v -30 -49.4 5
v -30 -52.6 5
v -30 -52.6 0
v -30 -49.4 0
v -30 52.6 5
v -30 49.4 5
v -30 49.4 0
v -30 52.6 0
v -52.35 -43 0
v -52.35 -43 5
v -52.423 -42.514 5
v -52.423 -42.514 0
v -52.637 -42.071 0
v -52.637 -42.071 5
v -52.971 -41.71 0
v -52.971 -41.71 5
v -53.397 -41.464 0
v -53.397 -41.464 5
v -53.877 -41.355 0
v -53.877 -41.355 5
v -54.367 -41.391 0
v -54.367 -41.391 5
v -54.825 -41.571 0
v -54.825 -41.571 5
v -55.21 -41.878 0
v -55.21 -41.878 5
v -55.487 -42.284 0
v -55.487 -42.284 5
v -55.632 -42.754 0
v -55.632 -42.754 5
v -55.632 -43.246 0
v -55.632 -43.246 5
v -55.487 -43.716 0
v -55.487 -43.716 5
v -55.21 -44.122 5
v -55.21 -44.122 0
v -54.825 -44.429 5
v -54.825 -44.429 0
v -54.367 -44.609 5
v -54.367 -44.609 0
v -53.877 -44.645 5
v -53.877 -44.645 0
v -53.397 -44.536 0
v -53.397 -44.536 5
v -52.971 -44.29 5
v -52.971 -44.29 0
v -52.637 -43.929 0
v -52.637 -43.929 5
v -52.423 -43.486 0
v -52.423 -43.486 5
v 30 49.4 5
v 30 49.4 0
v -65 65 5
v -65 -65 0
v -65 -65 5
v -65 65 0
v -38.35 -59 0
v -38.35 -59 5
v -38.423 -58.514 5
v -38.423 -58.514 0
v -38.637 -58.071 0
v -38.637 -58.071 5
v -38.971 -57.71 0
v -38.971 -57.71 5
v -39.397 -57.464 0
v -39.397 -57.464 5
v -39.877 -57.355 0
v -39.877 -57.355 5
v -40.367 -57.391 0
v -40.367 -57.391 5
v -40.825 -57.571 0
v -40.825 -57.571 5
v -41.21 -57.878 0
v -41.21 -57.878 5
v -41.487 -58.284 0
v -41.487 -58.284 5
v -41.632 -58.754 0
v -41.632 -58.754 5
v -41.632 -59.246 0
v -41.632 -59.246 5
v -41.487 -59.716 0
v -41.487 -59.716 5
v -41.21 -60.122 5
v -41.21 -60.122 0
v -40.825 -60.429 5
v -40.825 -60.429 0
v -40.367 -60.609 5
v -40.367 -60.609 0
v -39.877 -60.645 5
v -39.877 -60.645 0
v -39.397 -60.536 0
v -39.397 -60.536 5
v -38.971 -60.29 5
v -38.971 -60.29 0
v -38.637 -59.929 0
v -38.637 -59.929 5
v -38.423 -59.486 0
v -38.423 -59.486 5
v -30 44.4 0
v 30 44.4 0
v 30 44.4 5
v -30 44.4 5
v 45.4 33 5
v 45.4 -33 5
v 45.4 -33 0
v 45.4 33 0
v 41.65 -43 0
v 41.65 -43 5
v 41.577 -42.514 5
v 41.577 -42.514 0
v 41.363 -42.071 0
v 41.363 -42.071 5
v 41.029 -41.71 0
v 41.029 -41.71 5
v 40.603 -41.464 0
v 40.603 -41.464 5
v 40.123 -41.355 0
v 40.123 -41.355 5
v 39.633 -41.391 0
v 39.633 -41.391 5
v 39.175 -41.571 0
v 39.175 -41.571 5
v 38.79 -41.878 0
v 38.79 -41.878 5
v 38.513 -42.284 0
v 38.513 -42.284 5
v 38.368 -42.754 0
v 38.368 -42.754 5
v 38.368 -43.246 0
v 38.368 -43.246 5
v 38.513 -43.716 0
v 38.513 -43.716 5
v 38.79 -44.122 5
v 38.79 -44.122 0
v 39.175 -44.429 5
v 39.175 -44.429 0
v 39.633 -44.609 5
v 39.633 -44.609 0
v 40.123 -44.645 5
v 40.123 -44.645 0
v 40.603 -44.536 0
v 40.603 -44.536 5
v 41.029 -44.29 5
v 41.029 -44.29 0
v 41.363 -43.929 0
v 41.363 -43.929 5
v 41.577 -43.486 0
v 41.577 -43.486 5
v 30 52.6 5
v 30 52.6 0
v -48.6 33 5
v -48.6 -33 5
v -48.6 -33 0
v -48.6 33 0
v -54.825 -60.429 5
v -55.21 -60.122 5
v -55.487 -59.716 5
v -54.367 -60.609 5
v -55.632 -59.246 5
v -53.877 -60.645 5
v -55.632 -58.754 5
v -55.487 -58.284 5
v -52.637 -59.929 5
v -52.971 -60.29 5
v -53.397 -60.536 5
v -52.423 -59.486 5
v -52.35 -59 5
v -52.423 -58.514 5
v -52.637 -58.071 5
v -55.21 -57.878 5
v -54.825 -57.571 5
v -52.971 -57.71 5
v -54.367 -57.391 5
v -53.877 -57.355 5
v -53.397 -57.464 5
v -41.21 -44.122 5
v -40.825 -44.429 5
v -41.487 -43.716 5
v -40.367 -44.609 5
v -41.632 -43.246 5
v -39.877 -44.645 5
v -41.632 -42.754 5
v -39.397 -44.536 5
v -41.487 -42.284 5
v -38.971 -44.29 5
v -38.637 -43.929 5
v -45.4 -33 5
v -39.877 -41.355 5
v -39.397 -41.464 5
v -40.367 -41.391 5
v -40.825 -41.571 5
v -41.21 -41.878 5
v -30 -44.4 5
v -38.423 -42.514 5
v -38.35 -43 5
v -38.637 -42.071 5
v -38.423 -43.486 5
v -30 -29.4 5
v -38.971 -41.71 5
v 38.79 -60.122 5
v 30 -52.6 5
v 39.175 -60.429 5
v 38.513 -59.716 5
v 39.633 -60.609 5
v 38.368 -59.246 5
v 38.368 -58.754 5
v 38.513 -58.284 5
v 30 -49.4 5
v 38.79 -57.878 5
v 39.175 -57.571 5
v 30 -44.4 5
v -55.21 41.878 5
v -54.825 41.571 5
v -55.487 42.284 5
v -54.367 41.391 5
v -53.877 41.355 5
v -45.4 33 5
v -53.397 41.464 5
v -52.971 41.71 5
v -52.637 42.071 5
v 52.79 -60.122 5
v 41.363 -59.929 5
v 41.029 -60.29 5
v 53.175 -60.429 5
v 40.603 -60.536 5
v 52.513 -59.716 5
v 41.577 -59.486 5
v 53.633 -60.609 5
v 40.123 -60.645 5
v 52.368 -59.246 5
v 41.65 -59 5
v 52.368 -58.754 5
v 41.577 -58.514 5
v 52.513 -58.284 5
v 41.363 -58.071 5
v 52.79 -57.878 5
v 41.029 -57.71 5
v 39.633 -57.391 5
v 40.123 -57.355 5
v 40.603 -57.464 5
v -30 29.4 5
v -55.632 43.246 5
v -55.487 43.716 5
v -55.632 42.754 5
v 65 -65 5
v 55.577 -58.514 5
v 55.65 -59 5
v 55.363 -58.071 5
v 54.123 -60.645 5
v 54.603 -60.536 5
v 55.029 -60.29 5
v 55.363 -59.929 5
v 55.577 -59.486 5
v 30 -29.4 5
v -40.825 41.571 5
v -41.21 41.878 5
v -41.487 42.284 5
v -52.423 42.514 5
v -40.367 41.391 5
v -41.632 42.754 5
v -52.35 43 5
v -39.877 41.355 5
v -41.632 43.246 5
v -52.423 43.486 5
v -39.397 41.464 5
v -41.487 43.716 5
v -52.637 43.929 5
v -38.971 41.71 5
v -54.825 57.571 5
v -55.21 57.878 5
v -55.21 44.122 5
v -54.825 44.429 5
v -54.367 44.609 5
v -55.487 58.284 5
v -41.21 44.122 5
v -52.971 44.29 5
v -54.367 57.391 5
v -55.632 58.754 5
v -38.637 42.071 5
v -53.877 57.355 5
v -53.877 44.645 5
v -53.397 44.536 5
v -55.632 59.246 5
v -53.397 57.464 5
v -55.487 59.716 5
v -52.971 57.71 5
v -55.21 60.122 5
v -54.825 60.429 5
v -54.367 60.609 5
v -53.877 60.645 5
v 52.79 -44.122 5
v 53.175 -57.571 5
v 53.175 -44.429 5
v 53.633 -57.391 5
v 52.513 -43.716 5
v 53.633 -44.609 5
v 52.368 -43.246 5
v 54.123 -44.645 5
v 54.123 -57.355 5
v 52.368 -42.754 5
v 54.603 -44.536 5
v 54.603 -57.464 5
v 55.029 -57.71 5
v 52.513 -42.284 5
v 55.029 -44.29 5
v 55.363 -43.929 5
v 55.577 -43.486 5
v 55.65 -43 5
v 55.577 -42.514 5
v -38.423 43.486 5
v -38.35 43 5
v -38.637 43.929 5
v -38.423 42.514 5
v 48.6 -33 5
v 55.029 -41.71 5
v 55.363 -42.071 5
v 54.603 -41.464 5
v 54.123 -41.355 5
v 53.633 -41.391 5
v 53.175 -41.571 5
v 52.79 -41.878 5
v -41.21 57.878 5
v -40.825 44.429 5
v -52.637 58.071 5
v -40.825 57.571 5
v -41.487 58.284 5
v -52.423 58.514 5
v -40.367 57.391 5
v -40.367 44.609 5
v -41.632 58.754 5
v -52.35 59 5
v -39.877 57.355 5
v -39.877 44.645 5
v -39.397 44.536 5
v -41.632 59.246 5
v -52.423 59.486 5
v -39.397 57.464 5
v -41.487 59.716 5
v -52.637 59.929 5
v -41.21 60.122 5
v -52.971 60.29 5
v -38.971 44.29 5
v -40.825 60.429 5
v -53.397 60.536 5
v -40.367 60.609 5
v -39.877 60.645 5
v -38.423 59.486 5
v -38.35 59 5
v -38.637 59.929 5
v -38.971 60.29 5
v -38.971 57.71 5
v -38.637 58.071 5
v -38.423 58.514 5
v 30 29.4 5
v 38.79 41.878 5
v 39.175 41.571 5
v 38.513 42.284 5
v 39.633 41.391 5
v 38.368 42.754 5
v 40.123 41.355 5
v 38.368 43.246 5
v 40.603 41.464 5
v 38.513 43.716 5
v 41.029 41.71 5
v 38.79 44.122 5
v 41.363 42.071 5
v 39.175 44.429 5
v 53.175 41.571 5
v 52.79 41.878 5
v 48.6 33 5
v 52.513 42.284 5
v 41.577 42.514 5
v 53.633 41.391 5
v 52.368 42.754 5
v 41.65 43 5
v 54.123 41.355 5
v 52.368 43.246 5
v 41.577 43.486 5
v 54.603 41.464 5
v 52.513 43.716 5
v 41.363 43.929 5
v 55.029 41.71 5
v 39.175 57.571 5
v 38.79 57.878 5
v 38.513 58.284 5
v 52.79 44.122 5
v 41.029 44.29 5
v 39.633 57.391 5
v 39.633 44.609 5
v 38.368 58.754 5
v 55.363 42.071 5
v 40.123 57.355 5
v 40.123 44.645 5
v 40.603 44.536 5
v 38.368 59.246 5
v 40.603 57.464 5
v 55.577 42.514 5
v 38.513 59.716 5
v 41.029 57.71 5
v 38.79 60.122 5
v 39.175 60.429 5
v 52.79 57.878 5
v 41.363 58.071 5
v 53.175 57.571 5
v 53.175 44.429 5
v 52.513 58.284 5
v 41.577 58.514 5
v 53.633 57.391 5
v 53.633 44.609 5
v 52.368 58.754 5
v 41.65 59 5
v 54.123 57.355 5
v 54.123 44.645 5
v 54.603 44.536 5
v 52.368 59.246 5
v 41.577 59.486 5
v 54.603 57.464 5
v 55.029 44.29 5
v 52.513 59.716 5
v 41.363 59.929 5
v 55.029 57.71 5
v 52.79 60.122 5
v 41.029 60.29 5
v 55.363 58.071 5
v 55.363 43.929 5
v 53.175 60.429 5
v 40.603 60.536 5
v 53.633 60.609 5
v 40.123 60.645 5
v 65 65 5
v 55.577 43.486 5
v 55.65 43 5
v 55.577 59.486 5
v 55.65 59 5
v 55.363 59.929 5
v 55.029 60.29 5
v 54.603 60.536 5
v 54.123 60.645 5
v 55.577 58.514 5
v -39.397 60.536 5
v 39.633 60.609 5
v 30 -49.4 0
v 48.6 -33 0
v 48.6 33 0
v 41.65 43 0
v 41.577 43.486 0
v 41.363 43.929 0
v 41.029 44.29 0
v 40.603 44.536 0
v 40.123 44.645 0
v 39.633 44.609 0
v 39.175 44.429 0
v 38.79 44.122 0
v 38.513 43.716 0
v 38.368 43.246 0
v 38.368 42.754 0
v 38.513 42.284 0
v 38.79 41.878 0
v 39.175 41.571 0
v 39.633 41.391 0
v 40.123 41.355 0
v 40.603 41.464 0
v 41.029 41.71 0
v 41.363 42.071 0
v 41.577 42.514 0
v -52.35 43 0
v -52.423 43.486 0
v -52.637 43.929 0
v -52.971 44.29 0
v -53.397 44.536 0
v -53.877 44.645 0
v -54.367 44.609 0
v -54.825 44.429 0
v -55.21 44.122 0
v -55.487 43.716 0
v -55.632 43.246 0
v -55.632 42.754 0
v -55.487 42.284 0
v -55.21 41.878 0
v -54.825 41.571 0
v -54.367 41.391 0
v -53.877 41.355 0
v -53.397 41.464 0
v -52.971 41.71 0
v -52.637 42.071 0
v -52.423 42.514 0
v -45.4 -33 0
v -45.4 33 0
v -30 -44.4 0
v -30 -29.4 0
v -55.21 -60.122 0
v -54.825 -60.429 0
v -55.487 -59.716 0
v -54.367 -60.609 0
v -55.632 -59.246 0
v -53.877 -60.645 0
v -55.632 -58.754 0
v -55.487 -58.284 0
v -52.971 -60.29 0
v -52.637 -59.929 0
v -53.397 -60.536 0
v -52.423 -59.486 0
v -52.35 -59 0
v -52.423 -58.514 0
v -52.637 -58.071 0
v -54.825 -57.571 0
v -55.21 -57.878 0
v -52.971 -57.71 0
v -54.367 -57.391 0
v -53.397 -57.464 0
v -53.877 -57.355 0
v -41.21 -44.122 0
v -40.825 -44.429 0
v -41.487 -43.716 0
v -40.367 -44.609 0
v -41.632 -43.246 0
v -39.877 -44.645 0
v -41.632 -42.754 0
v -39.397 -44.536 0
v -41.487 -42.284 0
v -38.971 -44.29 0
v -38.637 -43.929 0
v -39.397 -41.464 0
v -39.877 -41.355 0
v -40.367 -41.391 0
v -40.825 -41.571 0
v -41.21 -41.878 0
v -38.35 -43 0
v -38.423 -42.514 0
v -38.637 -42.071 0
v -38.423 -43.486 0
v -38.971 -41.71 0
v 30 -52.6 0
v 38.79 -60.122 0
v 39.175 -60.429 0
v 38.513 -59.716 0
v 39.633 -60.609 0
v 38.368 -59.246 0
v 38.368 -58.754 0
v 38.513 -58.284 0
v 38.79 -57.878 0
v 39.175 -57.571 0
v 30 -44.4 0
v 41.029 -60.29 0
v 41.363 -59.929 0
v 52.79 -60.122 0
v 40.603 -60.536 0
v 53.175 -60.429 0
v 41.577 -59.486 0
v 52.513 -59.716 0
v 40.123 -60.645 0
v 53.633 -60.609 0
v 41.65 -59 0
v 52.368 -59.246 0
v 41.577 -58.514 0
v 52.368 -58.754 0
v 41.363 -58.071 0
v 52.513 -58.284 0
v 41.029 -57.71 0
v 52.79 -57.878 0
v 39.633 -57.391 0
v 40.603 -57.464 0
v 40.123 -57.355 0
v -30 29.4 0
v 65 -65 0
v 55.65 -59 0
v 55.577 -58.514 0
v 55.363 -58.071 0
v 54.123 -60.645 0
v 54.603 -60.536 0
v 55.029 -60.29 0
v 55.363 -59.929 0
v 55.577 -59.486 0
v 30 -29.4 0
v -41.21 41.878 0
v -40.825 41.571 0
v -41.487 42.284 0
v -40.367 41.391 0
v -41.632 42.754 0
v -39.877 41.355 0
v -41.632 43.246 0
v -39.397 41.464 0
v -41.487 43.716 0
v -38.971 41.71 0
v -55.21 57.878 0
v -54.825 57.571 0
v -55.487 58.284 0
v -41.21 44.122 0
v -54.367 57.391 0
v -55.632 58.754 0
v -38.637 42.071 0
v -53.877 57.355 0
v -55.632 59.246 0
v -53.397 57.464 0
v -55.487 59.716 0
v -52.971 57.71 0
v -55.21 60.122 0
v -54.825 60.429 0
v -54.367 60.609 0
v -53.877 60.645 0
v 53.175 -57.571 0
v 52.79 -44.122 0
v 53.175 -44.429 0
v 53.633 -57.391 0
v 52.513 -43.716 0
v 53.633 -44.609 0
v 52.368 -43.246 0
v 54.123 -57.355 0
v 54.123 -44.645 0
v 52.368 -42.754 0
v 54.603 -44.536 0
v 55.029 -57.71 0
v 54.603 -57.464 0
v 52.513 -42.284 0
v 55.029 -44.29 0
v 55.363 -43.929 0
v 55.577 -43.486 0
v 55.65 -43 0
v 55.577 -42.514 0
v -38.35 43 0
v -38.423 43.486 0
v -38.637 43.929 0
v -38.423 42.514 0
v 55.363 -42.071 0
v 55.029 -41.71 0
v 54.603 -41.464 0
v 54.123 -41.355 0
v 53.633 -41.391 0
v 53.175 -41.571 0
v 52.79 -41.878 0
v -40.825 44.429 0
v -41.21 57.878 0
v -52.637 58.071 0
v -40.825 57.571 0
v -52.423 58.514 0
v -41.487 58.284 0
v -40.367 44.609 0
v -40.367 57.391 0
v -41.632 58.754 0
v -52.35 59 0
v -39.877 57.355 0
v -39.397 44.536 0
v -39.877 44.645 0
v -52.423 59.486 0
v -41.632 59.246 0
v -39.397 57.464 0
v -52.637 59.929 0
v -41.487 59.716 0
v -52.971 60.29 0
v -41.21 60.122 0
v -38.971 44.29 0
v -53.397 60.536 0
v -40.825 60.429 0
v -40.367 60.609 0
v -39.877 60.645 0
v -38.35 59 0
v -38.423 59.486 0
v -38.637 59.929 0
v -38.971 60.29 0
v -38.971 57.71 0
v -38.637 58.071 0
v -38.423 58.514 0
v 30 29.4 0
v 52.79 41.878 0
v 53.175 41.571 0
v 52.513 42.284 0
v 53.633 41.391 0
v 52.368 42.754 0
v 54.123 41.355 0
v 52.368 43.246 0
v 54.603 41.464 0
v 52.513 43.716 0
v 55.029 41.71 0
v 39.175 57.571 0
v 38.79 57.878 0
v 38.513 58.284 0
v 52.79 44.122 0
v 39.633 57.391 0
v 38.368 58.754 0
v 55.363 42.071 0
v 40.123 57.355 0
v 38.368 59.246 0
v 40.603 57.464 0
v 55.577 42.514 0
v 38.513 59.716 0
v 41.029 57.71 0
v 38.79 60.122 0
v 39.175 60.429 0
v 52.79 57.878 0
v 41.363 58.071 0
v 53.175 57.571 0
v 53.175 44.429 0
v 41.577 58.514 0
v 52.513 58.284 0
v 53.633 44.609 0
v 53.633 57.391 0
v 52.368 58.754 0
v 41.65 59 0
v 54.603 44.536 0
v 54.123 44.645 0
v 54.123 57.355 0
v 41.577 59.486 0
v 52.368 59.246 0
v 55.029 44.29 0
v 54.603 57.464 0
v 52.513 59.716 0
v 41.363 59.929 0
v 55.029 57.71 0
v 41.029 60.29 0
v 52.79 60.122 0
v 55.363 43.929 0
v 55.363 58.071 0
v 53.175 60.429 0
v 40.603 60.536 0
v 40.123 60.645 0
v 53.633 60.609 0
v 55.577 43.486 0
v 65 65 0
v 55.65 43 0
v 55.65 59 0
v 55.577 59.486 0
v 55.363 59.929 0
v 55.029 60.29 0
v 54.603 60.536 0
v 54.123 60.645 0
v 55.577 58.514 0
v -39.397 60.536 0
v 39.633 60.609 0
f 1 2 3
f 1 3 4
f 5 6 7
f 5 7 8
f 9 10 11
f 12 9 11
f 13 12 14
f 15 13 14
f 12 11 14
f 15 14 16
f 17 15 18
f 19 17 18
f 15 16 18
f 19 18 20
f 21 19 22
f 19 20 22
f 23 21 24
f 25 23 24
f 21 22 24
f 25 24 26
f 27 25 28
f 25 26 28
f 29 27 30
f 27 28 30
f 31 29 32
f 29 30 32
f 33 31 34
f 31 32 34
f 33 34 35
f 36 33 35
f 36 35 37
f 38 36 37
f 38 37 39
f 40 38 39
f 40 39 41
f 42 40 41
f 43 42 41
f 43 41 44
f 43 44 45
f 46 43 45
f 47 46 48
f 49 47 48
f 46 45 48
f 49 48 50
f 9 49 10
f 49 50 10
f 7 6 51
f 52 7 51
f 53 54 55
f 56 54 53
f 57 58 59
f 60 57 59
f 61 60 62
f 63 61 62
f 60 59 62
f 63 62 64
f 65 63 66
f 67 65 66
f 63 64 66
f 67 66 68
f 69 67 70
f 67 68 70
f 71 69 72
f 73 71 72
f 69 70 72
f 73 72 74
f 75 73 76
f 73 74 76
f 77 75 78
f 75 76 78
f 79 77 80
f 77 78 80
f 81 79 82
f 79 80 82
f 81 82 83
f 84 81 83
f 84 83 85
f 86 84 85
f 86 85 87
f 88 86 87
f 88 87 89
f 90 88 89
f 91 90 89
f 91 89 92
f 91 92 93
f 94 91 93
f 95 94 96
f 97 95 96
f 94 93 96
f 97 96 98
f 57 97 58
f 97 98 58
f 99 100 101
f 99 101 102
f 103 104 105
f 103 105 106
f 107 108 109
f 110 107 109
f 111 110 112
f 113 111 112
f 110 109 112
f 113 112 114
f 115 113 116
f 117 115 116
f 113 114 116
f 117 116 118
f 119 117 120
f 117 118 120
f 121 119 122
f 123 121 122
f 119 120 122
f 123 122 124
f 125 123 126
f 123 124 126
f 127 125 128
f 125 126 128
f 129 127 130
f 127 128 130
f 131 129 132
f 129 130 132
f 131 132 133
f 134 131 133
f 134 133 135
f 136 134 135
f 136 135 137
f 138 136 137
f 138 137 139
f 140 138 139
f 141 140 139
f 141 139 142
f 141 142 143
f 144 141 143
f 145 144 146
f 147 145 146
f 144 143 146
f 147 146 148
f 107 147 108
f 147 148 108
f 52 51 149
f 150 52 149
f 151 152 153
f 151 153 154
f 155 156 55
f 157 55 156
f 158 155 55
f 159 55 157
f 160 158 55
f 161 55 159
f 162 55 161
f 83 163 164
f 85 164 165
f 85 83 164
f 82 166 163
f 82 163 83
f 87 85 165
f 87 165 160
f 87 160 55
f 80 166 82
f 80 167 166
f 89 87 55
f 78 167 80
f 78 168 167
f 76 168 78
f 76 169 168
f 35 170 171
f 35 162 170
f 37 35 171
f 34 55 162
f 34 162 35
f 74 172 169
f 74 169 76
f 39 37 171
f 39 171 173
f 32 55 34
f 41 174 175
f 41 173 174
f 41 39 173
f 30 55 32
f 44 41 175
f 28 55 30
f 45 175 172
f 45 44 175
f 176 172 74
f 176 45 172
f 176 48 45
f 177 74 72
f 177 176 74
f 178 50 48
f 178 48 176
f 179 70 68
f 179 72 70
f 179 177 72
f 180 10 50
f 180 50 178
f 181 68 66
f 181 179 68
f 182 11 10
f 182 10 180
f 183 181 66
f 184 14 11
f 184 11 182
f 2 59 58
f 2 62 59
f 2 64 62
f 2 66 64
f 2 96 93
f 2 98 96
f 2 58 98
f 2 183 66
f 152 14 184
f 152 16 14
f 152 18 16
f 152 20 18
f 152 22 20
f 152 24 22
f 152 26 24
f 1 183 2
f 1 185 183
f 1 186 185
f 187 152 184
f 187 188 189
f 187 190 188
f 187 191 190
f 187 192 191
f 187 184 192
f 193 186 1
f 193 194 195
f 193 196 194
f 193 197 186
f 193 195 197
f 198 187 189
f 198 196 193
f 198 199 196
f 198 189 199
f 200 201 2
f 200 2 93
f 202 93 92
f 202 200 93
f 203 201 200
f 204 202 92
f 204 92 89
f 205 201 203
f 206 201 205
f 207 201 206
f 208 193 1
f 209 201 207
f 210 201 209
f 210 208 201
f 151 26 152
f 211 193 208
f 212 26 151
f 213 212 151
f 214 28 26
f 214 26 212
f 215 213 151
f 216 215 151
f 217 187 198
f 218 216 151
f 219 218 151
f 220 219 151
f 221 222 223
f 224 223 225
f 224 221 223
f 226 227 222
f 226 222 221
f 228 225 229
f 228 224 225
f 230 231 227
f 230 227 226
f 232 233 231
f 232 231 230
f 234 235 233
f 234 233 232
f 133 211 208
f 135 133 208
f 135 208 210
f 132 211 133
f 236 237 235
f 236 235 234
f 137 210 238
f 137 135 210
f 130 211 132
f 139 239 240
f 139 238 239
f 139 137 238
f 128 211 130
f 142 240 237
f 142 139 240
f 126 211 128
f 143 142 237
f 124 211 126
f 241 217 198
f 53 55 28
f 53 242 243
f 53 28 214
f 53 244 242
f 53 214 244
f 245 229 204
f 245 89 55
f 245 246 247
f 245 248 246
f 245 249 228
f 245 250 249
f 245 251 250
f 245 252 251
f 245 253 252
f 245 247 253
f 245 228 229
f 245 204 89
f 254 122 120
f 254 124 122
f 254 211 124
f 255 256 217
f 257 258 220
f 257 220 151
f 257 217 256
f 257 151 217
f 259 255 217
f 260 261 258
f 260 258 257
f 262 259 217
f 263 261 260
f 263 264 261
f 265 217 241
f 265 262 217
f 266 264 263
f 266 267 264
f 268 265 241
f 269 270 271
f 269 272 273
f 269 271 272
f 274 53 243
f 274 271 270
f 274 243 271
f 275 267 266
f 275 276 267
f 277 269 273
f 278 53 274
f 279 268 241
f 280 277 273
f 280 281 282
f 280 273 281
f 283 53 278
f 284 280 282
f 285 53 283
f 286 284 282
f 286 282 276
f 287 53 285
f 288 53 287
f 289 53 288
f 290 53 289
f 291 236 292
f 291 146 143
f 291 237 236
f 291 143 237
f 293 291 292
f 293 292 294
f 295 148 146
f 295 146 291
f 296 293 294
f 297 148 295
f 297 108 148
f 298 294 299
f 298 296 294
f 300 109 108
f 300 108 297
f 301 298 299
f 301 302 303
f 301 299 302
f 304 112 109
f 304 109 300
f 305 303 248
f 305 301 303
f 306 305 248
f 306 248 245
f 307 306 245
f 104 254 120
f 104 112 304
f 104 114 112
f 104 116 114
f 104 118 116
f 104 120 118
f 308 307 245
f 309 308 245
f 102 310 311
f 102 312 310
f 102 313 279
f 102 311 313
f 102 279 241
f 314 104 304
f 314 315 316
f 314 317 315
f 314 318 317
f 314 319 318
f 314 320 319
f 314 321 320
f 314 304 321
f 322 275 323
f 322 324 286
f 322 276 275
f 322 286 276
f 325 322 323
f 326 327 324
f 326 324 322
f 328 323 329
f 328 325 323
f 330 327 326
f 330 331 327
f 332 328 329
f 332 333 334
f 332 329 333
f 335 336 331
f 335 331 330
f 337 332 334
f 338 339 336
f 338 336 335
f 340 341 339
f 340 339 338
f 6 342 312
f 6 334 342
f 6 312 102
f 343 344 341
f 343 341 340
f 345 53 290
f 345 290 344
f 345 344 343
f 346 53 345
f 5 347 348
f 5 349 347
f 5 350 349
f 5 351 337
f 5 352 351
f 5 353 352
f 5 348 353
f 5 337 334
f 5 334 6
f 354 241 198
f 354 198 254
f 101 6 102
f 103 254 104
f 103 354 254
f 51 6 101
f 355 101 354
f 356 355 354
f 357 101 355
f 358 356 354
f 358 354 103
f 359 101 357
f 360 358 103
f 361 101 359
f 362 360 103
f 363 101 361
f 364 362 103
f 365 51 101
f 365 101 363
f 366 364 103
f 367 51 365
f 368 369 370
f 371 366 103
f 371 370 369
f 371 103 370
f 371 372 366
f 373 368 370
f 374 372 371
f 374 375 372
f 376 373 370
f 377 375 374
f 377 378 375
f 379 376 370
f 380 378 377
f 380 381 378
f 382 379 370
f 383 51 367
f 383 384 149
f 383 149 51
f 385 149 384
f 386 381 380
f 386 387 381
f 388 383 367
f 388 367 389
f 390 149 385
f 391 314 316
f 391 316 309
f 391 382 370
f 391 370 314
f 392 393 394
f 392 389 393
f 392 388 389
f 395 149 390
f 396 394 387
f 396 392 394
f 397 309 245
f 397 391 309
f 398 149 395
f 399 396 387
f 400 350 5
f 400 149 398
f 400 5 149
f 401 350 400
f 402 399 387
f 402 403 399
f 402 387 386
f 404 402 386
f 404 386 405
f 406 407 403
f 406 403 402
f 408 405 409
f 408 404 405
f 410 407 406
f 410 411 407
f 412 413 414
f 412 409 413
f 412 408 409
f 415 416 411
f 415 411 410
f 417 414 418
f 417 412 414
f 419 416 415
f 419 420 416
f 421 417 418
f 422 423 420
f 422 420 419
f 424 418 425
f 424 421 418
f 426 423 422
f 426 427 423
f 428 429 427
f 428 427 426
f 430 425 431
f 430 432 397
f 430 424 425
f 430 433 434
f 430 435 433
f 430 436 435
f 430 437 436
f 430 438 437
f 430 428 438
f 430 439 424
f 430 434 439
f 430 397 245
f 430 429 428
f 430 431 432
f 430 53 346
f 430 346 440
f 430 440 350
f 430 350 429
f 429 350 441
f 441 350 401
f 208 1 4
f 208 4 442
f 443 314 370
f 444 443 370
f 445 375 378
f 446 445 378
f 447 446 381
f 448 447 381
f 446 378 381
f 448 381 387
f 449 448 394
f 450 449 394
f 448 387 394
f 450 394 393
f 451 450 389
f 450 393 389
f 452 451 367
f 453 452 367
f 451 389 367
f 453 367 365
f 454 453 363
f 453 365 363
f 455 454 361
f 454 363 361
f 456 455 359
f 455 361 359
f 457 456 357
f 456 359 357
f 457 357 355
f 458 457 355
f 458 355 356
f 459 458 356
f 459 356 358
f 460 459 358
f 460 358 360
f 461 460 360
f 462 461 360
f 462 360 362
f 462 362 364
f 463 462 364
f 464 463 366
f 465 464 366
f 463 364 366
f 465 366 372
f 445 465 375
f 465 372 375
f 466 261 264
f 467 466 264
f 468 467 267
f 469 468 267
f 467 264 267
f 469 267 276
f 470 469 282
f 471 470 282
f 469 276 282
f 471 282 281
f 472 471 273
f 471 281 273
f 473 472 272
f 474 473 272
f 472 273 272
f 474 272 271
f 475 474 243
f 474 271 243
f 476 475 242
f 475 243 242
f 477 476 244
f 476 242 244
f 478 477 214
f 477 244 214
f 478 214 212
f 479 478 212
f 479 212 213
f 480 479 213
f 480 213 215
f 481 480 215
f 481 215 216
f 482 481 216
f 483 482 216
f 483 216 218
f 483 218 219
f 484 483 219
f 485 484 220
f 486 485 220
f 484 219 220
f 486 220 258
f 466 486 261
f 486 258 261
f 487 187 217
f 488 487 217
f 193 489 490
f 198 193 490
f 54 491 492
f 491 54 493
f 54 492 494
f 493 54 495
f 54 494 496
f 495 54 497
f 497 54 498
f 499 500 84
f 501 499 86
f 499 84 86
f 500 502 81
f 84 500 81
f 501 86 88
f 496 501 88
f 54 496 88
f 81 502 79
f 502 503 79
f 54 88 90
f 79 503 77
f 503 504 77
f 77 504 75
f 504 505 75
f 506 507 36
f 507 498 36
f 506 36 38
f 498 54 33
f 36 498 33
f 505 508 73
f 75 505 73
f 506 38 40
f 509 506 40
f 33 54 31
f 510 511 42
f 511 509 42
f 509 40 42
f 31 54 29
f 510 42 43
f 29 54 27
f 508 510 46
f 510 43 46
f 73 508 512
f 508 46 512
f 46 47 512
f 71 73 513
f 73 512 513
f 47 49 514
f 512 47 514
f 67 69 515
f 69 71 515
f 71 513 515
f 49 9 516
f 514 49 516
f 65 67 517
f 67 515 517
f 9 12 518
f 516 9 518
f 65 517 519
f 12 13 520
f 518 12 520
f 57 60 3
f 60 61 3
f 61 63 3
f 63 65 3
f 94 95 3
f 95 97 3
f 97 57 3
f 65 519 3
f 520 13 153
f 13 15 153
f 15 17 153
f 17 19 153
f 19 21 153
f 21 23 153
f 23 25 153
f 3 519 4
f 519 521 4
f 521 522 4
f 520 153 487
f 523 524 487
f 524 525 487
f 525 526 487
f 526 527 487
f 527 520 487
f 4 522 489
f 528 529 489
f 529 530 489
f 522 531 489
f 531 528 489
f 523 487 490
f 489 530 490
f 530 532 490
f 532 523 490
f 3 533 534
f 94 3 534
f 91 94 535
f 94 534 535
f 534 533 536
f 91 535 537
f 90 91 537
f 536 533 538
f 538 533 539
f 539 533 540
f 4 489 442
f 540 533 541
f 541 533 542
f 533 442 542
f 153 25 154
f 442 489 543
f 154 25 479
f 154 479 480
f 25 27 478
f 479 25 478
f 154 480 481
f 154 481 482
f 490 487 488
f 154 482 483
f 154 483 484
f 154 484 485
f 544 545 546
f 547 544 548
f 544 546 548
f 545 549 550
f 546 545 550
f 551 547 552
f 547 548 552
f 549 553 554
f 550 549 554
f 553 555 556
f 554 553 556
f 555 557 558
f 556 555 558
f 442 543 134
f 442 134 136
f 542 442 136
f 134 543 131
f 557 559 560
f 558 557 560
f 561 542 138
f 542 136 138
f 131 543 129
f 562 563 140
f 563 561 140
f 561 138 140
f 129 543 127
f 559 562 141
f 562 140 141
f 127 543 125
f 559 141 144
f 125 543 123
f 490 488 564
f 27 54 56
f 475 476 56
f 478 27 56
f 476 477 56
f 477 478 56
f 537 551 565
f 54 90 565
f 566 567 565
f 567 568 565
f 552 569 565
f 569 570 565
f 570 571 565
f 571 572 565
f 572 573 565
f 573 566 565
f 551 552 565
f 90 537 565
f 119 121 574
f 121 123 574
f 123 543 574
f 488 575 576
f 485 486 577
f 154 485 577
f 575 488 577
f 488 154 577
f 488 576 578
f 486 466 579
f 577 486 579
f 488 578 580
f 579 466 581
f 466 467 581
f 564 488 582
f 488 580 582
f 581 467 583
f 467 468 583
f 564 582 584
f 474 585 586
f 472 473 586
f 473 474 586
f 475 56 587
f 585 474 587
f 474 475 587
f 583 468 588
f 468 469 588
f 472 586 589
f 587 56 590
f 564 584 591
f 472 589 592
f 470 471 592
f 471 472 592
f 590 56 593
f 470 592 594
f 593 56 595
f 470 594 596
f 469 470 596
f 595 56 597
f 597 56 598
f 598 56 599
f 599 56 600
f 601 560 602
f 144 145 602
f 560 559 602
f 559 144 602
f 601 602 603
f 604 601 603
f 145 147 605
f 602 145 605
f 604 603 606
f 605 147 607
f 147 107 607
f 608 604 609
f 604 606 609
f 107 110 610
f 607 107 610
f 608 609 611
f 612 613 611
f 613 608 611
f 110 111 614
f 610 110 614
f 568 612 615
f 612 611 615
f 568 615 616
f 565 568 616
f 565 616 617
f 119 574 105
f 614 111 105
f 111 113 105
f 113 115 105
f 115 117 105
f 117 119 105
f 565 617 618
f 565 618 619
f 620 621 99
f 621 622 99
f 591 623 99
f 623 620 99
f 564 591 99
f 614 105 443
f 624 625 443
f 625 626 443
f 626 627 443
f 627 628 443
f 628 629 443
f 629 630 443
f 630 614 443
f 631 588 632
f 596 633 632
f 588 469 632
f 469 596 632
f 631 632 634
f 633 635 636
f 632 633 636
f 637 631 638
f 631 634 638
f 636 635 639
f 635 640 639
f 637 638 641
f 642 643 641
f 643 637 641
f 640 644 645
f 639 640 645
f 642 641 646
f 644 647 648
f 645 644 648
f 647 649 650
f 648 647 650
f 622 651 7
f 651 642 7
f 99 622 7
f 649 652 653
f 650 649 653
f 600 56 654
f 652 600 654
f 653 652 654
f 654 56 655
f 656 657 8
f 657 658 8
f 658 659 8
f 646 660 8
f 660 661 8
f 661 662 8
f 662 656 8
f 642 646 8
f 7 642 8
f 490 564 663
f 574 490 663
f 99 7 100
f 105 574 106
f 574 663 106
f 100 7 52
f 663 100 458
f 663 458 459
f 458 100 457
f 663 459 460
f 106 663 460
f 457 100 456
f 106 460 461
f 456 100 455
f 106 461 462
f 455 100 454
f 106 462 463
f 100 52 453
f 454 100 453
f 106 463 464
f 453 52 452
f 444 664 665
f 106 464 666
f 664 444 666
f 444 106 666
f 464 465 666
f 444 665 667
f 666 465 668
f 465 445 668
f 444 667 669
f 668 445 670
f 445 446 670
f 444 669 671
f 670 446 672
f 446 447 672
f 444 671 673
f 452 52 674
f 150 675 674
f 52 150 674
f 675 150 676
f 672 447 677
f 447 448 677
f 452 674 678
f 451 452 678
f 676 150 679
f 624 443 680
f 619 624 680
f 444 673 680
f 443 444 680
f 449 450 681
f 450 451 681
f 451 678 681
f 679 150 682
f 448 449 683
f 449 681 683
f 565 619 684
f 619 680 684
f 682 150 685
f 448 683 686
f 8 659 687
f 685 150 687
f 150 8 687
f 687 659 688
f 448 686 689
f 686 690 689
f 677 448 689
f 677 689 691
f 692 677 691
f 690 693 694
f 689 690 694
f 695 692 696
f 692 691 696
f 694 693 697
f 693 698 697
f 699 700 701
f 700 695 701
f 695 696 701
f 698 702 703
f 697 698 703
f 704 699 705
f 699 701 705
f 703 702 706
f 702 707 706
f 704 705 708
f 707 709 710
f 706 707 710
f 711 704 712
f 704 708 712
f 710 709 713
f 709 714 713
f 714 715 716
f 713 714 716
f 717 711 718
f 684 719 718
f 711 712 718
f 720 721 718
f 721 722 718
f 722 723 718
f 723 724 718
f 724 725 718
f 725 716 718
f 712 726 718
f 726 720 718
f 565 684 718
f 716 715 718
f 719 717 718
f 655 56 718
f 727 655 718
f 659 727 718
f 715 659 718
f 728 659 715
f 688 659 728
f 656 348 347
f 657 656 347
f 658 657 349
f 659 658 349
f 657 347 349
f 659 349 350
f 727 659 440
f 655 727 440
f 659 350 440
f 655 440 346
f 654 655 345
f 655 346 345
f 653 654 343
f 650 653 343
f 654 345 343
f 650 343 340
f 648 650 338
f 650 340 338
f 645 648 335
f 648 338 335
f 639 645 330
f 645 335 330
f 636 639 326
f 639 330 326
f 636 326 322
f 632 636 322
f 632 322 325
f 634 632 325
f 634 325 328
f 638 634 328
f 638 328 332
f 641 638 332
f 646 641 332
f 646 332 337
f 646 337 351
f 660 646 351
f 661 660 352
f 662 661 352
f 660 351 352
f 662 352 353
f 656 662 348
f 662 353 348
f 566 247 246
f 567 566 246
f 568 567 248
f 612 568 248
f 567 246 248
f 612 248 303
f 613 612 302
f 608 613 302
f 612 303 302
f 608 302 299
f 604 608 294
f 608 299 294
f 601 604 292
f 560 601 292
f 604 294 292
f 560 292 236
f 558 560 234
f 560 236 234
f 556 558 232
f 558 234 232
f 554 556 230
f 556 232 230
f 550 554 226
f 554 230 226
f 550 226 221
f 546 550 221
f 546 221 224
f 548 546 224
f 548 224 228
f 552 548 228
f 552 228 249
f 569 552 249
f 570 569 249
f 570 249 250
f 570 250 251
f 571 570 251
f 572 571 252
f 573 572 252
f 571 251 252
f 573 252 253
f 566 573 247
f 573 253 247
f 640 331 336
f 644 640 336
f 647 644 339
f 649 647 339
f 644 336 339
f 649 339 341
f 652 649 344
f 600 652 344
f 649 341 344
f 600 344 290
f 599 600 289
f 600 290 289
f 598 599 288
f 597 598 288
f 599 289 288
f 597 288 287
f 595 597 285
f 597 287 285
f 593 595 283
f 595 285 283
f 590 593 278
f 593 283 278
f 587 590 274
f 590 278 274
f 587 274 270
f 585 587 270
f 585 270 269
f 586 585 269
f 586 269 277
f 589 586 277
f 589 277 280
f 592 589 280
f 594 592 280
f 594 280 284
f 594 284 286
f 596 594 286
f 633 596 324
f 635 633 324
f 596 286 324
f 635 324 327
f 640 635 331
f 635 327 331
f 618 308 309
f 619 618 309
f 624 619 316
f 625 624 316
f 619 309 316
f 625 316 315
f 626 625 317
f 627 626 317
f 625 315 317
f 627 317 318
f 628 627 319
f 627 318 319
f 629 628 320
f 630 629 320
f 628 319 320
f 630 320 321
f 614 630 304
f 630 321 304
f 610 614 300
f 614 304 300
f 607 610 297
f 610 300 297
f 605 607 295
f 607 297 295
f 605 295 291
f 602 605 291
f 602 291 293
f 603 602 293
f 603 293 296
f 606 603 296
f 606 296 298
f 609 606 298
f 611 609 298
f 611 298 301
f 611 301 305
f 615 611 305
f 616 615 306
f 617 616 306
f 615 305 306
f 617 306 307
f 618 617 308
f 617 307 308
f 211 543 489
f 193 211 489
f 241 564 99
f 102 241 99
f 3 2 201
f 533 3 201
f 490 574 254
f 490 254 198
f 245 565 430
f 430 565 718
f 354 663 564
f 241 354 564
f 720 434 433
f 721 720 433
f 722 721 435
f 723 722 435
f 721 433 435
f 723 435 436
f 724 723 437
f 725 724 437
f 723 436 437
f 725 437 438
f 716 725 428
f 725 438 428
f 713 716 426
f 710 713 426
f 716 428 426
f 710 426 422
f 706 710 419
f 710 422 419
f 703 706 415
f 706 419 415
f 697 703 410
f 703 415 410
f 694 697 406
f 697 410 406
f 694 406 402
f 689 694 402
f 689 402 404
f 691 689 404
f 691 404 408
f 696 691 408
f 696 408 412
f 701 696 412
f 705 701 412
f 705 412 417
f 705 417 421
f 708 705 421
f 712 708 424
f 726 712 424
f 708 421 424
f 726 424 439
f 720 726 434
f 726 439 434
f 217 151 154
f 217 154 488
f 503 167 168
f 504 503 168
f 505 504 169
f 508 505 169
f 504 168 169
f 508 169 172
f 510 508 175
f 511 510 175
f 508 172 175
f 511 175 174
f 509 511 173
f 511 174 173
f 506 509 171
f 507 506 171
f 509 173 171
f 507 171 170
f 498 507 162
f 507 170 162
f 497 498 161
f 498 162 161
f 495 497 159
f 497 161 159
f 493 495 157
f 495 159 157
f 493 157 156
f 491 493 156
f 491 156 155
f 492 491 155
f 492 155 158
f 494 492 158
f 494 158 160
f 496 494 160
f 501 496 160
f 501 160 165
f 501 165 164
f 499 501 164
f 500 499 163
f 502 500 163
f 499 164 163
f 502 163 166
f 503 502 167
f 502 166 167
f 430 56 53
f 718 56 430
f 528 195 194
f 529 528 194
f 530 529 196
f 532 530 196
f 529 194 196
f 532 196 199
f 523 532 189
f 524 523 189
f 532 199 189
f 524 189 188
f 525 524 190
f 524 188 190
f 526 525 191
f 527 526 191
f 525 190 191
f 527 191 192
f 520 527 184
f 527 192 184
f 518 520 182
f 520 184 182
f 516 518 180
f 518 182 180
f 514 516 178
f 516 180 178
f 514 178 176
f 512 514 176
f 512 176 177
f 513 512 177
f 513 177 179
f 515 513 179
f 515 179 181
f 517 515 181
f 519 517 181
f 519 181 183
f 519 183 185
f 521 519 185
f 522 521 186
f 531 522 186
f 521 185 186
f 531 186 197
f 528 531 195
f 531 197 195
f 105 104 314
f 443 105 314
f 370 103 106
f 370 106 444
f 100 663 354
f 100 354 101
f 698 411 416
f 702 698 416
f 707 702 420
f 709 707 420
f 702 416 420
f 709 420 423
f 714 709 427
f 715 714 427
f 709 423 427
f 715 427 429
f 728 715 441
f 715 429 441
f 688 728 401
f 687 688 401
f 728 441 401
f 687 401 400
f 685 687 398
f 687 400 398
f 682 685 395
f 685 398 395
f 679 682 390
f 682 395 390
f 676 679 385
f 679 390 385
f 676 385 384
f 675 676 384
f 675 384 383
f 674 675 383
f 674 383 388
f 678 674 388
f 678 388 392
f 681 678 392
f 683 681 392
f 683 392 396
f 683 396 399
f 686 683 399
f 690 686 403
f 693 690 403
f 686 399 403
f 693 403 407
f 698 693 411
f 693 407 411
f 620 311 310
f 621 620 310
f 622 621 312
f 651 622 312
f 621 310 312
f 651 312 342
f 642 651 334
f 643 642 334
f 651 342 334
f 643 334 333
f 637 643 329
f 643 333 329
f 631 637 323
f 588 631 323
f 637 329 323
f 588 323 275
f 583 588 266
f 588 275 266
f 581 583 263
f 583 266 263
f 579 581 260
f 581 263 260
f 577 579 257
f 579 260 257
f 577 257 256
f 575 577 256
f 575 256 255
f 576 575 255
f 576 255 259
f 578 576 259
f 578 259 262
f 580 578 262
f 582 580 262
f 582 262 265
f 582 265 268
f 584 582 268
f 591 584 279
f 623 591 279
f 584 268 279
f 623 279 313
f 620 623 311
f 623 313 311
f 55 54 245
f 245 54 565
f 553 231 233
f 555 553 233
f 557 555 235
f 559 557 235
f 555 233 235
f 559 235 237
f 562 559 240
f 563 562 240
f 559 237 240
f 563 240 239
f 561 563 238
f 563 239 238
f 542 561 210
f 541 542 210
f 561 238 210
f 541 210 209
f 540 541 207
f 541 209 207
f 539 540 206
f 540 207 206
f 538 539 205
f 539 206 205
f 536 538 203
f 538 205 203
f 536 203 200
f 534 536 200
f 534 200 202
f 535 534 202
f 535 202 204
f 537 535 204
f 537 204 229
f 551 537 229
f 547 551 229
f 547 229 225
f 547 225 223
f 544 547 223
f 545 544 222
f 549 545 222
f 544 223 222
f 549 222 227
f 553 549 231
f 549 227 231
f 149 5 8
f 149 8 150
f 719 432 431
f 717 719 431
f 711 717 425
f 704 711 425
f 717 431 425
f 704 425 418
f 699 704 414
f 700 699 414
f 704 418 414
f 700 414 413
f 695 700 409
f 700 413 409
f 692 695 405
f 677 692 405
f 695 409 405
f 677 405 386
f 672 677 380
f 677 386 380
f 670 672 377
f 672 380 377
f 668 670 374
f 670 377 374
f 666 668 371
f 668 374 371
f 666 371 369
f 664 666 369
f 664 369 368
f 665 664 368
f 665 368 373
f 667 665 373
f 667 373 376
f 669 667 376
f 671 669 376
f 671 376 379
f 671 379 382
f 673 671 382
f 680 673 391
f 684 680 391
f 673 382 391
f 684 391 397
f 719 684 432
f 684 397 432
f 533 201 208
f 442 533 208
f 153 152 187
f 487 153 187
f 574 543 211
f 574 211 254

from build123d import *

# Parameters (mm, degrees)
SKETCH_1_W          = 130
SKETCH_1_H          = 130
EXTRUDE_1_DEPTH     = 5
SKETCH_2_R          = 1.65
CUT_EXTRUDE_1_DEPTH = 5
SKETCH_3_W          = 3.2
SKETCH_3_H          = 66
SKETCH_3_W_2        = 60
SKETCH_3_H_2        = 3.2
CUT_EXTRUDE_2_DEPTH = 10
SKETCH_4_W          = 60
SKETCH_4_H          = 15
CUT_EXTRUDE_3_DEPTH = 10


with BuildPart() as part:
    # 草图1 → 凸台-拉伸1 (new body)
    with BuildSketch(Plane.XY):
        Rectangle(SKETCH_1_W, SKETCH_1_H)
    extrude(amount=EXTRUDE_1_DEPTH)

    # 草图2 → 切除-拉伸1 (cut)
    with BuildSketch(Plane.XY.offset(5)):
        with Locations((-54, 59)):
            Circle(SKETCH_2_R)
        with Locations((-40, 59)):
            Circle(SKETCH_2_R)
        with Locations((-40, 43)):
            Circle(SKETCH_2_R)
        with Locations((-54, 43)):
            Circle(SKETCH_2_R)
        with Locations((40, 59)):
            Circle(SKETCH_2_R)
        with Locations((54, 59)):
            Circle(SKETCH_2_R)
        with Locations((54, 43)):
            Circle(SKETCH_2_R)
        with Locations((40, 43)):
            Circle(SKETCH_2_R)
        with Locations((40, -43)):
            Circle(SKETCH_2_R)
        with Locations((54, -43)):
            Circle(SKETCH_2_R)
        with Locations((54, -59)):
            Circle(SKETCH_2_R)
        with Locations((40, -59)):
            Circle(SKETCH_2_R)
        with Locations((-54, -43)):
            Circle(SKETCH_2_R)
        with Locations((-40, -43)):
            Circle(SKETCH_2_R)
        with Locations((-40, -59)):
            Circle(SKETCH_2_R)
        with Locations((-54, -59)):
            Circle(SKETCH_2_R)
    extrude(amount=-CUT_EXTRUDE_1_DEPTH, mode=Mode.SUBTRACT)

    # 草图3 → 切除-拉伸2 (cut)
    with BuildSketch(Plane.XY.offset(5)):
        with Locations((47, 0)):
            Rectangle(SKETCH_3_W, SKETCH_3_H)
        with Locations((-47, 0)):
            Rectangle(SKETCH_3_W, SKETCH_3_H)
        with Locations((0, -51)):
            Rectangle(SKETCH_3_W_2, SKETCH_3_H_2)
        with Locations((0, 51)):
            Rectangle(SKETCH_3_W_2, SKETCH_3_H_2)
    extrude(amount=-CUT_EXTRUDE_2_DEPTH, mode=Mode.SUBTRACT)

    # 草图4 → 切除-拉伸3 (cut)
    with BuildSketch(Plane(origin=(0, 0, 0), x_dir=(-1, 0, 0), z_dir=(0, 0, -1))):
        with Locations((0, 36.9)):
            Rectangle(SKETCH_4_W, SKETCH_4_H)
        with Locations((0, -36.9)):
            Rectangle(SKETCH_4_W, SKETCH_4_H)
    extrude(amount=-CUT_EXTRUDE_3_DEPTH, mode=Mode.SUBTRACT)


solid = part.part
